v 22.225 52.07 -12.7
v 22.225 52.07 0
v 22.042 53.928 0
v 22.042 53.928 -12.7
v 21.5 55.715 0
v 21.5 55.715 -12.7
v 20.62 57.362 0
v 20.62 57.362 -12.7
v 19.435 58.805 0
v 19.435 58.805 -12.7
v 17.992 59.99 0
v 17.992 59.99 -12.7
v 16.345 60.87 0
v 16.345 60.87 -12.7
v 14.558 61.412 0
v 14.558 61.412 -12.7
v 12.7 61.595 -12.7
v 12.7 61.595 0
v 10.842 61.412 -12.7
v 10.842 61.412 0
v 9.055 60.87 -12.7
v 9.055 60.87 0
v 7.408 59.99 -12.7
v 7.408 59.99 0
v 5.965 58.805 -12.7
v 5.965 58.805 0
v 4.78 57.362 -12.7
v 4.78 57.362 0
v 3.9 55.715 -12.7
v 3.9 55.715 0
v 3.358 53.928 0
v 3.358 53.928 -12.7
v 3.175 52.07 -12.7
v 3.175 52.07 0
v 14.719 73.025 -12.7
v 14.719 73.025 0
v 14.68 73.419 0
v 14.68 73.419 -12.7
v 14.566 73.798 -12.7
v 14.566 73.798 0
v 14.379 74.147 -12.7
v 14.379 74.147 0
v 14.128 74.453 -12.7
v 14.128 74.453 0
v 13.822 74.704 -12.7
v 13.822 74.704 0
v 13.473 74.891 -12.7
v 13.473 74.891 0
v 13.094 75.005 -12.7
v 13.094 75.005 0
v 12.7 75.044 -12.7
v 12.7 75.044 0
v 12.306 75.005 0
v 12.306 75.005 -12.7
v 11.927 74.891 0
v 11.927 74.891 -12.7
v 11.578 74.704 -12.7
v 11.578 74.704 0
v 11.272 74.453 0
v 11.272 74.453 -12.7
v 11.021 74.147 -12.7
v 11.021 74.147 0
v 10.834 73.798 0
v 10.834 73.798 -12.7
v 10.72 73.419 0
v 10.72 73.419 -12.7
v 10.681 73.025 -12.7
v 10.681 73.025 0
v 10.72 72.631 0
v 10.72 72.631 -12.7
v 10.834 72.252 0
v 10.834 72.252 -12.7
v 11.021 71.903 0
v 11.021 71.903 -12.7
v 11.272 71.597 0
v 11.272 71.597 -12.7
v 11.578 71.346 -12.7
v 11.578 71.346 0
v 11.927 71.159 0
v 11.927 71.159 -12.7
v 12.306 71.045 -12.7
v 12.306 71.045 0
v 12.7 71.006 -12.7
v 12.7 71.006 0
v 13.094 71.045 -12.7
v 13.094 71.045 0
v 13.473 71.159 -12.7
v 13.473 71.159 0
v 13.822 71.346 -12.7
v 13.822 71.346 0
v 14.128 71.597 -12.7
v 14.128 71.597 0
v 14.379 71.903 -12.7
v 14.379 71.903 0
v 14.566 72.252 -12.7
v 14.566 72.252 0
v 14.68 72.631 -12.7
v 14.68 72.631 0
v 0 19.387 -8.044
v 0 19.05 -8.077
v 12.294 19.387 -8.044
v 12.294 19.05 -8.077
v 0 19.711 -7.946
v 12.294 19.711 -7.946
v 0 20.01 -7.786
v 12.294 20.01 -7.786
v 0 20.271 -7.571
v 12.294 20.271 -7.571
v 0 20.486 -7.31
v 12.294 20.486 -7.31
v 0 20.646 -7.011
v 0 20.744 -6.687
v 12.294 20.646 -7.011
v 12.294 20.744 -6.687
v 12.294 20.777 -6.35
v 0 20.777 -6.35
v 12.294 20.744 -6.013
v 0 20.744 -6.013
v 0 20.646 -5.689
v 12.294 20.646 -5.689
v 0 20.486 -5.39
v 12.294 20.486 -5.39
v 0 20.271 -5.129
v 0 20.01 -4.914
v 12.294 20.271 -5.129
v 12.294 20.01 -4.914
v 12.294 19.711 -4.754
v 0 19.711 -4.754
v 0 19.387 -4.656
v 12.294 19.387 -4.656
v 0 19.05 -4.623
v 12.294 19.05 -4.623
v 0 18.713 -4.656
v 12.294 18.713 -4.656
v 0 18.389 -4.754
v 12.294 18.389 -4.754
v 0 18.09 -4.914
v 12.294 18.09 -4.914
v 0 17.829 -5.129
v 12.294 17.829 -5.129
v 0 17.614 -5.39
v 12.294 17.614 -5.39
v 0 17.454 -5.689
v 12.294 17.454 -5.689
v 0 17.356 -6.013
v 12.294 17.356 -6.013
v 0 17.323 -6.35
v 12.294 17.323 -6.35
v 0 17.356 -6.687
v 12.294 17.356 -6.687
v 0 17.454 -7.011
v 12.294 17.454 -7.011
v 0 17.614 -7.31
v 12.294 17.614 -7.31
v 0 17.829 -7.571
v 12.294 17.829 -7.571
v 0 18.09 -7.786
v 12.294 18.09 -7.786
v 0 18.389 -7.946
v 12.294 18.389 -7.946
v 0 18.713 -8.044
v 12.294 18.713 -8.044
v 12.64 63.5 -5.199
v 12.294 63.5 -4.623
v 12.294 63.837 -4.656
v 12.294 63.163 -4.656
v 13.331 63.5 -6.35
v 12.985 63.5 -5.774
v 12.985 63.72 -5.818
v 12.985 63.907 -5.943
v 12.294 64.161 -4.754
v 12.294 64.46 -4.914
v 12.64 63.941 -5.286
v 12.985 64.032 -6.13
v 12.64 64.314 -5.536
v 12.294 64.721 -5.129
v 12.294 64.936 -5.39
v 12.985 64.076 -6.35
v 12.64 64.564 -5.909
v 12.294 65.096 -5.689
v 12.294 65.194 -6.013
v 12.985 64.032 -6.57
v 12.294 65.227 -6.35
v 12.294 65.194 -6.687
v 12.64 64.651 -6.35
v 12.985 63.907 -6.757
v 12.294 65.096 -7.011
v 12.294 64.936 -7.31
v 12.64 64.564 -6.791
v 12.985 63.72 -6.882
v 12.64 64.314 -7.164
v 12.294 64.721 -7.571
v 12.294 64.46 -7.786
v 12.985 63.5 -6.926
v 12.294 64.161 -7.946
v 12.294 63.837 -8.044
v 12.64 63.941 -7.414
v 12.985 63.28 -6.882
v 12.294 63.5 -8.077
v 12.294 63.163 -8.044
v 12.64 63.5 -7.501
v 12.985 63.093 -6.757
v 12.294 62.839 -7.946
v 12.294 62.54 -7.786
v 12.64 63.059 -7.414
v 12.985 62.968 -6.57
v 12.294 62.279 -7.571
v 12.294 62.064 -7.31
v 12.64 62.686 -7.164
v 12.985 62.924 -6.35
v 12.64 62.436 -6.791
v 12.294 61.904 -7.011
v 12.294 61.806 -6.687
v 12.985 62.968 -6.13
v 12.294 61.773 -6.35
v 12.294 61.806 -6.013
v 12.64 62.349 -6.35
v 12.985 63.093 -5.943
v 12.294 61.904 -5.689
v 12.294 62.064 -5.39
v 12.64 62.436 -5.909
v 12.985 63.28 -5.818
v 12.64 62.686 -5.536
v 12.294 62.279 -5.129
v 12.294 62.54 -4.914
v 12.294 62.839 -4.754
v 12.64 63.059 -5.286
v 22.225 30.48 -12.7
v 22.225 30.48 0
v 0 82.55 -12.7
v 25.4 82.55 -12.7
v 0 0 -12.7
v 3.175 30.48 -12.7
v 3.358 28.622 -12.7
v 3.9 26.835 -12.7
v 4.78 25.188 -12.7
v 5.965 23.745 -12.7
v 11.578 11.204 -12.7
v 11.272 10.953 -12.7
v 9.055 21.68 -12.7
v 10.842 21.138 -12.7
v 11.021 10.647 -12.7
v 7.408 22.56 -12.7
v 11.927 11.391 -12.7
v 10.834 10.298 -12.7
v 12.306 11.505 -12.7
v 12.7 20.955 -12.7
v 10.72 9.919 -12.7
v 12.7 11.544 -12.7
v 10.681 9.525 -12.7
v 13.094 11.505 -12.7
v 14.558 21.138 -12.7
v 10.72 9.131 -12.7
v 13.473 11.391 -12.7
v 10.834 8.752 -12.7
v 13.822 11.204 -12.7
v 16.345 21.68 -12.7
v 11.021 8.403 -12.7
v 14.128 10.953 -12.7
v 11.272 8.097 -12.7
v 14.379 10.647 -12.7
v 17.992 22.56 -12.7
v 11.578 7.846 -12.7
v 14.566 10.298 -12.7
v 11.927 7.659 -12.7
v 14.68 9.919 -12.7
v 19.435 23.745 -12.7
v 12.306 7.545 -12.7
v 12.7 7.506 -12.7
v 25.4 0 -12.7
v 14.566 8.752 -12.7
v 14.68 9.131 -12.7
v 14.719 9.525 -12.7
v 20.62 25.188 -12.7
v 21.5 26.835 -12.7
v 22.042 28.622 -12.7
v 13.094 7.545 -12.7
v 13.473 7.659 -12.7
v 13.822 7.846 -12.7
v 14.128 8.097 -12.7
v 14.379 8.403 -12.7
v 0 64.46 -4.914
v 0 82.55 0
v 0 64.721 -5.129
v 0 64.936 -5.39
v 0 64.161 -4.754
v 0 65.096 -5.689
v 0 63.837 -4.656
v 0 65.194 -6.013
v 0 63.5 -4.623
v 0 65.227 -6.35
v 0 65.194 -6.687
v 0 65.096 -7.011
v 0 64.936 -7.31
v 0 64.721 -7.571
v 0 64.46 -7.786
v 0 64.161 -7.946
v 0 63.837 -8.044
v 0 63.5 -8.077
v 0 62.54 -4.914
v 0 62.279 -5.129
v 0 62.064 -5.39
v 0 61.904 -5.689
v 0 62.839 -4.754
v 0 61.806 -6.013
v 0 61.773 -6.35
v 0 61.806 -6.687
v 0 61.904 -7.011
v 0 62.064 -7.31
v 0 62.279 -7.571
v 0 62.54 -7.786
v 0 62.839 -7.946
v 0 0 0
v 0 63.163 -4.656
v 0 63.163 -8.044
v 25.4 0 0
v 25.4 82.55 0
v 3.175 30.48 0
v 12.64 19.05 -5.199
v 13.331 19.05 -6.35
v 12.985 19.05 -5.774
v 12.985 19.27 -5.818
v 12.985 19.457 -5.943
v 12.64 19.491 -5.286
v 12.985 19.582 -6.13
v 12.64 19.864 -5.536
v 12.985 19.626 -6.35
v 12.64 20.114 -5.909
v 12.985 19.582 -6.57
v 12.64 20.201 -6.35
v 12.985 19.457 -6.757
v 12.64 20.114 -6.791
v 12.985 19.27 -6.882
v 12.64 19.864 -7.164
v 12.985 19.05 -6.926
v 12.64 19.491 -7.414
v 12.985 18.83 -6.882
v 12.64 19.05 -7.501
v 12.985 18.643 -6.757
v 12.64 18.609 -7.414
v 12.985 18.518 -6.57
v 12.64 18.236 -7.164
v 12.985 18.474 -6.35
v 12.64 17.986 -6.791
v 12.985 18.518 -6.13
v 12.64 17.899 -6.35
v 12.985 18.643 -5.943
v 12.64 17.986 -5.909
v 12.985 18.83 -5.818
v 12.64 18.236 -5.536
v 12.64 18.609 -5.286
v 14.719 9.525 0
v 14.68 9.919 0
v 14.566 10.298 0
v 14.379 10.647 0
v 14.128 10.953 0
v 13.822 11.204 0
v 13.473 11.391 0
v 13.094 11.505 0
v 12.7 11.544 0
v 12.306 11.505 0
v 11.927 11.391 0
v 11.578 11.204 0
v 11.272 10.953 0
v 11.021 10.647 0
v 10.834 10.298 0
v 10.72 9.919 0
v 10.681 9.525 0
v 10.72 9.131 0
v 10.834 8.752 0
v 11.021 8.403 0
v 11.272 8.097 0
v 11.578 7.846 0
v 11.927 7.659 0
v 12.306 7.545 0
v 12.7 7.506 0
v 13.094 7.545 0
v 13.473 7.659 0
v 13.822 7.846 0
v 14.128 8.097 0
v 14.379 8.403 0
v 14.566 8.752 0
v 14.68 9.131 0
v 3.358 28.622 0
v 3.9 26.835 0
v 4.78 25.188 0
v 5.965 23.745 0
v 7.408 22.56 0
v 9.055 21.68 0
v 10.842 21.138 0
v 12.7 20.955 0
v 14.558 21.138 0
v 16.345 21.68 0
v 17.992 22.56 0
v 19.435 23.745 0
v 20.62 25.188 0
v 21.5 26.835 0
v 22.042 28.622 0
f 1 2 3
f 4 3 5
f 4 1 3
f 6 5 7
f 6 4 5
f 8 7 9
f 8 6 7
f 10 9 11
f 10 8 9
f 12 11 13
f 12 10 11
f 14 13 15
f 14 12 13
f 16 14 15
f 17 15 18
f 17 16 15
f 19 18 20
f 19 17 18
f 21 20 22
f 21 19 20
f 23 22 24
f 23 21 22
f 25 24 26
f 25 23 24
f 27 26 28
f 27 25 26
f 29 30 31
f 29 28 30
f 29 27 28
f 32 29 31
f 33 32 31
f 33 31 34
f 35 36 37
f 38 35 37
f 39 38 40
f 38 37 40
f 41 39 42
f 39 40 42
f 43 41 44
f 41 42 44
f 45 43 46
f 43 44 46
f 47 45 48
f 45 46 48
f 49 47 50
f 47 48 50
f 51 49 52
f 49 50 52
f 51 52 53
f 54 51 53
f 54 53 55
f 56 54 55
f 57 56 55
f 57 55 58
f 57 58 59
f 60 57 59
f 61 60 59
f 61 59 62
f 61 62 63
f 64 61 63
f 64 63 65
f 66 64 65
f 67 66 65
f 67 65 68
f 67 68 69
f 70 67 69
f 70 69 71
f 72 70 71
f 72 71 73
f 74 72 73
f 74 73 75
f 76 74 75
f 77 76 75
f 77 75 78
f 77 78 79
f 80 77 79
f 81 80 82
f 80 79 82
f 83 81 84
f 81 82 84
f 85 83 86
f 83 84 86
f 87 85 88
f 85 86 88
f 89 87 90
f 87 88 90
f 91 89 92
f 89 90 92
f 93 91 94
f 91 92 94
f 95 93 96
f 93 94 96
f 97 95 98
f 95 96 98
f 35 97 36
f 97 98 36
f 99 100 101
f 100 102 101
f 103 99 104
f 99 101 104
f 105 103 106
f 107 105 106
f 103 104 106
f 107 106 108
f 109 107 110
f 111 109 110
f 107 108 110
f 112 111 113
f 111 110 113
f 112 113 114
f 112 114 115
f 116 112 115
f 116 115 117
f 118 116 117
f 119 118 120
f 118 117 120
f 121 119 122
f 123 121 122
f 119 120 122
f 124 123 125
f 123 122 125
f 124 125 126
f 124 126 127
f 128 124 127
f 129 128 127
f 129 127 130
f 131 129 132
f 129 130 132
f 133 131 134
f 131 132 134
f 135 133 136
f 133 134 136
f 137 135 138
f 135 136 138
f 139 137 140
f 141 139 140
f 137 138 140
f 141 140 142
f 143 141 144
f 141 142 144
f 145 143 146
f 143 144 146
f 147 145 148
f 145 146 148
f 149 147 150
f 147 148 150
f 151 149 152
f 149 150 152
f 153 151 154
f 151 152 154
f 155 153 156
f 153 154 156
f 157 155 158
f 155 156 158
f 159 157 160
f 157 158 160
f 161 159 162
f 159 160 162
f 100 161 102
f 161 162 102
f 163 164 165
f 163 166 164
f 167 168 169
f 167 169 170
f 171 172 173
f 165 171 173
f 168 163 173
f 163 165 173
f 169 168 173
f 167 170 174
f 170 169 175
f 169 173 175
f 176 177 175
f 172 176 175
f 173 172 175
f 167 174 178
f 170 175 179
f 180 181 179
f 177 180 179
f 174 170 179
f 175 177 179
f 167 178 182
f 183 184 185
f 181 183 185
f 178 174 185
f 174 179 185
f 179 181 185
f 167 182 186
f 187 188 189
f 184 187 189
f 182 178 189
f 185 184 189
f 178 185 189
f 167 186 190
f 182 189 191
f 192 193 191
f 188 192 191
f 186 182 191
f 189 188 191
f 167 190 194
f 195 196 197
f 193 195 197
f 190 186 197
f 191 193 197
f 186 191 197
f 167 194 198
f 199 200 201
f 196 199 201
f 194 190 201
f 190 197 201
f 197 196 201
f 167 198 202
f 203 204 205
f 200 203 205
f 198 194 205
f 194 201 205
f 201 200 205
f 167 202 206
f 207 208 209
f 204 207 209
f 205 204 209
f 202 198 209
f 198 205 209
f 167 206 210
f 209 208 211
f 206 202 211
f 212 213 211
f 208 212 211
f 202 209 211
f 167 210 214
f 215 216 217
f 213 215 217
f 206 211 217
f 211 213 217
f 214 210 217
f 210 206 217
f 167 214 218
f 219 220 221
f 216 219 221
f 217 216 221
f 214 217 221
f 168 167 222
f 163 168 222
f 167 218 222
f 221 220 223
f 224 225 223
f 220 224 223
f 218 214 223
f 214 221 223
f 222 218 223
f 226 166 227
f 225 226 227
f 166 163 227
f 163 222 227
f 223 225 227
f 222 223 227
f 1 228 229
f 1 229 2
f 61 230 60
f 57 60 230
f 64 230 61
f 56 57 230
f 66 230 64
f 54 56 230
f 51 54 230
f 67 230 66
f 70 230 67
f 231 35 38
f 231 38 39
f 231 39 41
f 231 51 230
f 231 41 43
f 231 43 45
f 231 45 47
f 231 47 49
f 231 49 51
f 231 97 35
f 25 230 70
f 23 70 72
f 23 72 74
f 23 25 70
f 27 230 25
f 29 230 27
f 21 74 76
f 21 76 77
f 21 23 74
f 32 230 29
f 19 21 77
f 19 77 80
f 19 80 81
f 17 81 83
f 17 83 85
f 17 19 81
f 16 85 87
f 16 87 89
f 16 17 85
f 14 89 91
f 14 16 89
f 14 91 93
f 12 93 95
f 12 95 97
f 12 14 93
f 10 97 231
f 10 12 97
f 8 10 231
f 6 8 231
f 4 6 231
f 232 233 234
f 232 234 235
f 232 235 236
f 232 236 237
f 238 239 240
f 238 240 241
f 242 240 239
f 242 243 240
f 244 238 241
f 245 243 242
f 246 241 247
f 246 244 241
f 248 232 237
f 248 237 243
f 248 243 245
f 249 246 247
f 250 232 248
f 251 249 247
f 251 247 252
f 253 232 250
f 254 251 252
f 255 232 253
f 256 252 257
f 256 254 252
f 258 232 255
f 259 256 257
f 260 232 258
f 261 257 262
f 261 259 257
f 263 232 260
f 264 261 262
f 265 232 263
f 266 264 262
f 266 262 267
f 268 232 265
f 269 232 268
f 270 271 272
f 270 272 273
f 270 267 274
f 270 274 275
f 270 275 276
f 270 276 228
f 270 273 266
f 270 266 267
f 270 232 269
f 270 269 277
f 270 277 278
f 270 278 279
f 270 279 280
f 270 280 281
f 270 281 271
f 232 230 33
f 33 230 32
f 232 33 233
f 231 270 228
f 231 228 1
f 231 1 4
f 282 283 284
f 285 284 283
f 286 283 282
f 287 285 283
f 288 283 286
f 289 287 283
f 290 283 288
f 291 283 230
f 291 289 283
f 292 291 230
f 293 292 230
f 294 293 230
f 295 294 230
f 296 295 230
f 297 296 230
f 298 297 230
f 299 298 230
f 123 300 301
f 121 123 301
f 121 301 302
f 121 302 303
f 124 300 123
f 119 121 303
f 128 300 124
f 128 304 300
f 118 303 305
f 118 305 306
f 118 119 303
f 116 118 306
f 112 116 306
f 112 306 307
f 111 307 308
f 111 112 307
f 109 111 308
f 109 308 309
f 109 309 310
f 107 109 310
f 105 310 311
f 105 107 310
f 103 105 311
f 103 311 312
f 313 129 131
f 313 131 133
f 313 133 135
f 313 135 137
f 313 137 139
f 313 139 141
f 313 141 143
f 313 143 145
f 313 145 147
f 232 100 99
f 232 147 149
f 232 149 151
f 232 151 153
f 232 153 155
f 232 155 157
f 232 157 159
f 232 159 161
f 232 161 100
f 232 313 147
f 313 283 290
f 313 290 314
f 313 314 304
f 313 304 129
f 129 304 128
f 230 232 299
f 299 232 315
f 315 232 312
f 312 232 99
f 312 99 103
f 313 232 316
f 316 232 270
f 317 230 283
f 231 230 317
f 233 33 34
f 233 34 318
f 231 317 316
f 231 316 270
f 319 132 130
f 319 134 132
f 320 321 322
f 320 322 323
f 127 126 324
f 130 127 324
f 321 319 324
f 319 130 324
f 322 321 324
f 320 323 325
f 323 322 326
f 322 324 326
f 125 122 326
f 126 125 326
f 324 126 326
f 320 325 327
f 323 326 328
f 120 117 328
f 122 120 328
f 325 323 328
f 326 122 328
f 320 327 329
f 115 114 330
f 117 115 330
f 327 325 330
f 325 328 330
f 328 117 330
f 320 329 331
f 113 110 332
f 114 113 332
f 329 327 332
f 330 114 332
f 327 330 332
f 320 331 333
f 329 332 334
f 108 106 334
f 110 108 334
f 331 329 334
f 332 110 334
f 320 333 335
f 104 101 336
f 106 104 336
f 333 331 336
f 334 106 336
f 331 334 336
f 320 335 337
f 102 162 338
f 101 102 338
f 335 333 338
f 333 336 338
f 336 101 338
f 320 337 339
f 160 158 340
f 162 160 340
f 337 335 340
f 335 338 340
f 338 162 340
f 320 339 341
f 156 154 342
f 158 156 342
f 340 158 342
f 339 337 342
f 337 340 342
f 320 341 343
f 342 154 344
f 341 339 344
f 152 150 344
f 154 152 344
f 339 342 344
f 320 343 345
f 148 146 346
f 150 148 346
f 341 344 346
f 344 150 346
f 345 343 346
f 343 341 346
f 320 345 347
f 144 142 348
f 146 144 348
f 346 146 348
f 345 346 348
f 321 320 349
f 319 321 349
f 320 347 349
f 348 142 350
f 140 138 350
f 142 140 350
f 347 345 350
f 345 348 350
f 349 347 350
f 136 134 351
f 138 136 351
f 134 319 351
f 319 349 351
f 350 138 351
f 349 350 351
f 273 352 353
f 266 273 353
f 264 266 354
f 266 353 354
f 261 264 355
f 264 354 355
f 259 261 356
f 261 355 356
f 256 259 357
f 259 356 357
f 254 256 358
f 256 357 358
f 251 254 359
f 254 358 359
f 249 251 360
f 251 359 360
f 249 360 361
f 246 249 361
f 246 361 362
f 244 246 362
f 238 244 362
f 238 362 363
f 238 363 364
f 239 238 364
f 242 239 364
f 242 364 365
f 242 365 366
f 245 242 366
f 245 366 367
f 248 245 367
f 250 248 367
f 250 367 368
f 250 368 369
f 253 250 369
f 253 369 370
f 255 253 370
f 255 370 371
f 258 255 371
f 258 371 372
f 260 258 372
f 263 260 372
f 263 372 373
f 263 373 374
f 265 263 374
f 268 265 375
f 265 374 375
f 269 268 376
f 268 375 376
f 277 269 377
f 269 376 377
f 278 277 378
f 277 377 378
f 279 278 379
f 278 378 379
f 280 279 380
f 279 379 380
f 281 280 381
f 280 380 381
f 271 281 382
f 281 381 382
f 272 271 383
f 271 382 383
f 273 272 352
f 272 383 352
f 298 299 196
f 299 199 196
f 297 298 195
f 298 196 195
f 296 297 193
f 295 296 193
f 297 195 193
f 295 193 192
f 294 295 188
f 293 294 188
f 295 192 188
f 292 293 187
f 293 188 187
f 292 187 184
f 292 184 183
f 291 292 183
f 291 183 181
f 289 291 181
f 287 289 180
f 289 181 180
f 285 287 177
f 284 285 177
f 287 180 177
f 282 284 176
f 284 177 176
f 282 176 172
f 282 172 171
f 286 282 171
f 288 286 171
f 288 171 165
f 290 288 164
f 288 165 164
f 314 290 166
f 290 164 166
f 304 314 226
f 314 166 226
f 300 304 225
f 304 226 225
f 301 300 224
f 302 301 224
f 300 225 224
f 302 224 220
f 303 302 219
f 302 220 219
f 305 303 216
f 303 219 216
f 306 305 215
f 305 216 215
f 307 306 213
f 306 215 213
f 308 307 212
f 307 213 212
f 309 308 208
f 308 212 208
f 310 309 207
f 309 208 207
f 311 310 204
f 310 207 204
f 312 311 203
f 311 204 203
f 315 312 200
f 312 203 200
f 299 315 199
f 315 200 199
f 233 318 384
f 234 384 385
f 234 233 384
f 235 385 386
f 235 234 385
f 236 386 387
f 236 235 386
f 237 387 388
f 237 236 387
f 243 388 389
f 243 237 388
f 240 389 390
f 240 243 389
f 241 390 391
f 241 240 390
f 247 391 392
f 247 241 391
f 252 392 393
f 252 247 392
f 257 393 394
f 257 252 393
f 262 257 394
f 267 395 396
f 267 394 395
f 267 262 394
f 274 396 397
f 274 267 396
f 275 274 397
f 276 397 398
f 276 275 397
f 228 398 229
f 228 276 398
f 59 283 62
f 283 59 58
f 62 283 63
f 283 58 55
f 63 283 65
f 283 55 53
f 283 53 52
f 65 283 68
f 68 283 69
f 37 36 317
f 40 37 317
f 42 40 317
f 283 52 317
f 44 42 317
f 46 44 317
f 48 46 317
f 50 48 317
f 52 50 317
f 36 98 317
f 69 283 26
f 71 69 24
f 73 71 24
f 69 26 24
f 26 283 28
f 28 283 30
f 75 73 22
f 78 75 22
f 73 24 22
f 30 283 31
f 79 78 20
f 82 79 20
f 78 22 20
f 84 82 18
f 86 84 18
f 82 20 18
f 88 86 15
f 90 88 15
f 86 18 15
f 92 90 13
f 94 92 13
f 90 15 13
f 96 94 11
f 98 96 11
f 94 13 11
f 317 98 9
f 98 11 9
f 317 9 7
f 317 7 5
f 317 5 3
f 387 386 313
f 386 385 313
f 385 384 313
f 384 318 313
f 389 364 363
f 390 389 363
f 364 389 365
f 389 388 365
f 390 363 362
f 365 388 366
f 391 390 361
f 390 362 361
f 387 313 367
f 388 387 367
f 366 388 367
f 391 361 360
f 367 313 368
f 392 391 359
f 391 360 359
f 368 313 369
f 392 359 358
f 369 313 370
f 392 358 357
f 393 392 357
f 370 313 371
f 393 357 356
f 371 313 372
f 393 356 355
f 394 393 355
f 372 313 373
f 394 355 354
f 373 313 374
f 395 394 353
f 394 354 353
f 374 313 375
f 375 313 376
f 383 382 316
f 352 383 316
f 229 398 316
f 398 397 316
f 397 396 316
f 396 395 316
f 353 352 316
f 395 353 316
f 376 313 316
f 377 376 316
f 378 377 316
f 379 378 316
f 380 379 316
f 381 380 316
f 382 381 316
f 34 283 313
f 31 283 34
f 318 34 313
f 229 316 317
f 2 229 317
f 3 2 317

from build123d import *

# Parameters (mm, degrees)
SKETCH1_W                           = 25.4
SKETCH1_H                           = 12.7
BOSS_EXTRUDE1_DEPTH                 = 82.55
F_10_32_TAPPED_HOLE_TOP_HOLD_D      = 4.0386
F_8_32_TAPPED_HOLE_SIDE_PLATE_D     = 3.4544
F_8_32_TAPPED_HOLE_SIDE_PLATE_DEPTH = 12.2936
F_8_32_TAPPED_HOLE_SIDE_PLATE_TIP   = 1.037806461
CUT_EXTRUDE1_DEPTH                  = 88.298066989


with BuildPart() as part:
    # Sketch1 → Boss-Extrude1 (new body)
    with BuildSketch(Plane(origin=(0, 0, 0), x_dir=(1, 0, 0), z_dir=(0, 1, 0))):
        with Locations((12.7, 6.35)):
            Rectangle(SKETCH1_W, SKETCH1_H)
    extrude(amount=BOSS_EXTRUDE1_DEPTH)

    # #10-32 Tapped Hole - Top Hold (through all)
    with Locations(Plane(origin=(0, 0, -12.7), x_dir=(-1, 0, 0), z_dir=(0, 0, -1))):
        with Locations((-12.7, 9.525), (-12.7, 73.025)):
            Hole(F_10_32_TAPPED_HOLE_TOP_HOLD_D / 2)

    # #8-32 Tapped Hole - Side Plate
    with Locations(Plane.ZY):
        with Locations((-6.35, 19.05), (-6.35, 63.5)):
            Hole(F_8_32_TAPPED_HOLE_SIDE_PLATE_D / 2, depth=F_8_32_TAPPED_HOLE_SIDE_PLATE_DEPTH)
            with Locations((0, 0, -(F_8_32_TAPPED_HOLE_SIDE_PLATE_DEPTH + F_8_32_TAPPED_HOLE_SIDE_PLATE_TIP / 2))):  # 118° drill point
                Cone(0, F_8_32_TAPPED_HOLE_SIDE_PLATE_D / 2, F_8_32_TAPPED_HOLE_SIDE_PLATE_TIP, mode=Mode.SUBTRACT)

    # Sketch8 → Cut-Extrude1 (cut, through all)
    with BuildSketch(Plane(origin=(0, 0, -12.7), x_dir=(-1, 0, 0), z_dir=(0, 0, -1))):
        with BuildLine():
            Line((-22.225, 30.48), (-22.225, 52.07))
            ThreePointArc((-22.225, 52.07), (-12.7, 61.595), (-3.175, 52.07))
            Line((-3.175, 52.07), (-3.175, 30.48))
            ThreePointArc((-3.175, 30.48), (-12.7, 20.955), (-22.225, 30.48))
        make_face()
    extrude(amount=-CUT_EXTRUDE1_DEPTH, mode=Mode.SUBTRACT)


solid = part.part
